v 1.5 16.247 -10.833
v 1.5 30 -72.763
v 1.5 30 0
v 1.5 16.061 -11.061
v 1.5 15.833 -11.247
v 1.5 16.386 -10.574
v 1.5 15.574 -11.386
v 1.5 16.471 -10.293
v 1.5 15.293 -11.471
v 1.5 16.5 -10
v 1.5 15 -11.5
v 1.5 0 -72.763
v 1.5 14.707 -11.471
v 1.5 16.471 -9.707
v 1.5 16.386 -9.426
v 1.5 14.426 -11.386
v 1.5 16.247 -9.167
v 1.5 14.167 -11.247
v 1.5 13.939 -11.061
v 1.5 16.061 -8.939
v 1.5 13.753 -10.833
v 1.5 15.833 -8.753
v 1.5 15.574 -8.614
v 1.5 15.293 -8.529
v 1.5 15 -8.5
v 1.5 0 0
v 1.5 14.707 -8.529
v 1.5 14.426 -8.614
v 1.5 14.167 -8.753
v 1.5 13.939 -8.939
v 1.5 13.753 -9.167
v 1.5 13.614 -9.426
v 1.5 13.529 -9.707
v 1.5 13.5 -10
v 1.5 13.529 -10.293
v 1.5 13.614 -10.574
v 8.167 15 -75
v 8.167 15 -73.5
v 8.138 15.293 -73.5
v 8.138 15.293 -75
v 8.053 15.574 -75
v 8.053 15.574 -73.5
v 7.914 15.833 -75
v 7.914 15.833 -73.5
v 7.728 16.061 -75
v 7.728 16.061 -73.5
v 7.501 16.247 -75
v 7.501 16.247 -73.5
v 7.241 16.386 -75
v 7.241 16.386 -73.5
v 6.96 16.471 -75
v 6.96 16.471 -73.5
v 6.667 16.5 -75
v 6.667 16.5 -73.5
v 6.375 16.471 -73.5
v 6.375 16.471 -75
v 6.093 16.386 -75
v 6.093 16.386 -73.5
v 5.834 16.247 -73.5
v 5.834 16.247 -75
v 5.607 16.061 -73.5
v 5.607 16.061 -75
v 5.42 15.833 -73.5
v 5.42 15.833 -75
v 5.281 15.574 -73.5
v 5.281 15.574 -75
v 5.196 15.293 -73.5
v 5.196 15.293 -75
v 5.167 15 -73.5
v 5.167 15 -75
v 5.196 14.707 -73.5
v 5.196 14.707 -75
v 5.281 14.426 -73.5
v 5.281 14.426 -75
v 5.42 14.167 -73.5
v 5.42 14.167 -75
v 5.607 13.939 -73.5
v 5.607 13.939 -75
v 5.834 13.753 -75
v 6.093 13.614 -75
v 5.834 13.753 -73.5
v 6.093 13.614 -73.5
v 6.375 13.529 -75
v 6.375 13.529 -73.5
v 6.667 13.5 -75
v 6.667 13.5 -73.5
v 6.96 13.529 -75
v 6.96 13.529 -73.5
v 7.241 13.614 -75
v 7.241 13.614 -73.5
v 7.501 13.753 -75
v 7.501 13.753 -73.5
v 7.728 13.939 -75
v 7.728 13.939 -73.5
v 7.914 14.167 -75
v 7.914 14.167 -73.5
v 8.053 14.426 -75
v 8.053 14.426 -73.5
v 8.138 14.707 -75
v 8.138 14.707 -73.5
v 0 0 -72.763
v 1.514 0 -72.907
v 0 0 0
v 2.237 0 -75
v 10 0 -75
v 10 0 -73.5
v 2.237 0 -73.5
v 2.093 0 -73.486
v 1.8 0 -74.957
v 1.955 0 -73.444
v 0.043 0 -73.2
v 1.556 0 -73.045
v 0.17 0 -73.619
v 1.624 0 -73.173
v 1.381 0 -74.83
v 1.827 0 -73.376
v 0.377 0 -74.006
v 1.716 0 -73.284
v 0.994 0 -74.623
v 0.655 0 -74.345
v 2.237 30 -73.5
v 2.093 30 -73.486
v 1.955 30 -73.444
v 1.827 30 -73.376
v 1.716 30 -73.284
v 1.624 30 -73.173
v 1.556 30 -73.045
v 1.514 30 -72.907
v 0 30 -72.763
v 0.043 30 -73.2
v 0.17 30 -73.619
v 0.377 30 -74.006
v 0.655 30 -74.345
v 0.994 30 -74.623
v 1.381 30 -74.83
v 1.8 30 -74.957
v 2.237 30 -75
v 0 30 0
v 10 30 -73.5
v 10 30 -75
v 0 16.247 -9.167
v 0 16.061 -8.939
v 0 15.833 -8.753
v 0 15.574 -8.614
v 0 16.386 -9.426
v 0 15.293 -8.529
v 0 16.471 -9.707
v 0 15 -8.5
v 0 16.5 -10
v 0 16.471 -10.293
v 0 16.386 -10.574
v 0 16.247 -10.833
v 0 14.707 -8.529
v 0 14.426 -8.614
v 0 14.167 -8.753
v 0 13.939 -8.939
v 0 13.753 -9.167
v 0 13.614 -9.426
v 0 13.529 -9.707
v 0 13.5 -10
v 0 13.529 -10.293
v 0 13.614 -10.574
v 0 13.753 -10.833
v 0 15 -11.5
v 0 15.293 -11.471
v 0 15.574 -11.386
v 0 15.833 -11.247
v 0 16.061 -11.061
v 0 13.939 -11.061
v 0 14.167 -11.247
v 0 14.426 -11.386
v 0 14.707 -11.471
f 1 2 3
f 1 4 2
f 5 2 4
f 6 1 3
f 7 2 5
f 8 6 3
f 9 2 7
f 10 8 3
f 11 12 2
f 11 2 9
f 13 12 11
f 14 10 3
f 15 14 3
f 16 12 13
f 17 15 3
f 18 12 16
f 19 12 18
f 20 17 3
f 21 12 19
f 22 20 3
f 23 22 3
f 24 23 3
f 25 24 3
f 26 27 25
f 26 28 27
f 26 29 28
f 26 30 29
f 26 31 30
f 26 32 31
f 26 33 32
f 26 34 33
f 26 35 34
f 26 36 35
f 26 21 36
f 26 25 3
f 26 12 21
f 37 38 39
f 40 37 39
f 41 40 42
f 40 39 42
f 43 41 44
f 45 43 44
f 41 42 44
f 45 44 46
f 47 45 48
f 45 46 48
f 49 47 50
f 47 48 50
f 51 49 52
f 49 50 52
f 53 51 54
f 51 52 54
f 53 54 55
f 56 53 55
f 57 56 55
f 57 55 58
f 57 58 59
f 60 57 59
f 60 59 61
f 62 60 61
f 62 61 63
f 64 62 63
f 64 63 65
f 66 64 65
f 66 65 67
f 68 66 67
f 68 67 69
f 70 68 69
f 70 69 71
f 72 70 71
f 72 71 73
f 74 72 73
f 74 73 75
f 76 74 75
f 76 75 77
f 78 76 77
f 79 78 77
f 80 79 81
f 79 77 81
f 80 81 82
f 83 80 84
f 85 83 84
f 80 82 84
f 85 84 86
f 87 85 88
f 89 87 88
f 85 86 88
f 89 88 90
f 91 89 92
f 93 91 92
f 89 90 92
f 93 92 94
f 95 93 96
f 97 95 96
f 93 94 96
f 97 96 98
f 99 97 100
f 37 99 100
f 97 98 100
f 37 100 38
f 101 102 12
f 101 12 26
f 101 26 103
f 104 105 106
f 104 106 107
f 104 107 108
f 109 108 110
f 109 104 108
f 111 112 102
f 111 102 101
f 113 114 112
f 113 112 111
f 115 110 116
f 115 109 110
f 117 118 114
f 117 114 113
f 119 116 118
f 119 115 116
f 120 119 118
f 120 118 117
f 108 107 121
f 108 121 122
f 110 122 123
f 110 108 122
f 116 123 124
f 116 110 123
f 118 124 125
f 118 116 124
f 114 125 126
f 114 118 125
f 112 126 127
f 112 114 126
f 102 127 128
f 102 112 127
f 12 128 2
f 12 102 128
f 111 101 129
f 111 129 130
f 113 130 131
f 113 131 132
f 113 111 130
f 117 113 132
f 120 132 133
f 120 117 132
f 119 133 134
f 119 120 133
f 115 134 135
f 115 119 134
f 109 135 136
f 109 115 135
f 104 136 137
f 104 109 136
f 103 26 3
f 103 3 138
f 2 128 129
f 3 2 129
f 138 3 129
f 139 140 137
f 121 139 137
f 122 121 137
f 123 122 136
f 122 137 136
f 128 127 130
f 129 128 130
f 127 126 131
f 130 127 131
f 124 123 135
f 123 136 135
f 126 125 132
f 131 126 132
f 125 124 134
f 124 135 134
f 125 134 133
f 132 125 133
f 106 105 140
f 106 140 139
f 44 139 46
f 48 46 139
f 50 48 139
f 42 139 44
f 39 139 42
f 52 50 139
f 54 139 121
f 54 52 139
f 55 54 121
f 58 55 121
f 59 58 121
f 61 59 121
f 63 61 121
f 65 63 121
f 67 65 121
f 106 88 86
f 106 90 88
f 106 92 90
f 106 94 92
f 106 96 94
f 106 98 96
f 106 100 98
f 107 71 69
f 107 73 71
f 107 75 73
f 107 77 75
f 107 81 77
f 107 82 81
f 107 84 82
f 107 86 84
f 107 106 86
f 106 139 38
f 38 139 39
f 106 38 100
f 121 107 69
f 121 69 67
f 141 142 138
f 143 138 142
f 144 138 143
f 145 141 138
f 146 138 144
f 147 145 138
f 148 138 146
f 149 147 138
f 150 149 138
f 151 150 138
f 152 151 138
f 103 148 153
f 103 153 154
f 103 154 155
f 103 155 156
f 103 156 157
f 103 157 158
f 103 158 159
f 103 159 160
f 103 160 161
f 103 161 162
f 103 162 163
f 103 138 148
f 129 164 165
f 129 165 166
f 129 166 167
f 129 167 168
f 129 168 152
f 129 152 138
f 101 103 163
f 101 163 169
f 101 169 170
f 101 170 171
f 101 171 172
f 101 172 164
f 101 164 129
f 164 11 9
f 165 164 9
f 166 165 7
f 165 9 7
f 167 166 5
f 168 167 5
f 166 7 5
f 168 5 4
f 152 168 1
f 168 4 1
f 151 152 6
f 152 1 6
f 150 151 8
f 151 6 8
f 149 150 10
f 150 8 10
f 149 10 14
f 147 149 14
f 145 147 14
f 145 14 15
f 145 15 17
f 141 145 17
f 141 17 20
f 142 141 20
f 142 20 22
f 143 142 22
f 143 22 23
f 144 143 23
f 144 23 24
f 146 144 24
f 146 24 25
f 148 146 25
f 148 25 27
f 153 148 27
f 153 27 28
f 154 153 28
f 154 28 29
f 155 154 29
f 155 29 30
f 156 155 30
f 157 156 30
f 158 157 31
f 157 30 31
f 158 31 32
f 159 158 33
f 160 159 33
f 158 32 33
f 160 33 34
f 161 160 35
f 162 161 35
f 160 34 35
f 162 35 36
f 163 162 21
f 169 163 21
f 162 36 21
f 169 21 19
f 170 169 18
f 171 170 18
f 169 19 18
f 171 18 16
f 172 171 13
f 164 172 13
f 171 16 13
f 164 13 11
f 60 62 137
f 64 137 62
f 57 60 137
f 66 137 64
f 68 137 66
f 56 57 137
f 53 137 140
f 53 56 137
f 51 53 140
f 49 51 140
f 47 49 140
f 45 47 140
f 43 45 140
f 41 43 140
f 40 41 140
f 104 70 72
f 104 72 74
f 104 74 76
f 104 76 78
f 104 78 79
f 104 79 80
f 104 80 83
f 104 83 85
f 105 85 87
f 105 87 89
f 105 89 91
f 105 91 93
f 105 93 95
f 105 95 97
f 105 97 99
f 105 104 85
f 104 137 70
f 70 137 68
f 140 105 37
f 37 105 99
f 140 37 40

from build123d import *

# Parameters (mm, degrees)
BASE_FLANGE1_DEPTH              = 30
F_3_0MM_PRESS_DOWEL_HOLE1_D     = 3
F_3_0MM_PRESS_DOWEL_HOLE2_D     = 3
F_3_0MM_PRESS_DOWEL_HOLE3_D     = 3
F_3_0MM_PRESS_DOWEL_HOLE3_DEPTH = 6
F_3_0MM_PRESS_DOWEL_HOLE3_TIP   = 0.901290929


# Sheet-metal steps are written as plain solids
with BuildPart() as part:
    # Sketch2 → Base-Flange1 (new body)
    with BuildSketch(Plane(origin=(0, 0, 0), x_dir=(1, 0, 0), z_dir=(0, 1, 0))):
        with BuildLine():
            Line((0, 0), (0, 72.7634))
            ThreePointArc((0, 72.7634), (0.655084973, 74.344915027), (2.2366, 75))
            Line((2.2366, 75), (10, 75))
            Line((10, 75), (10, 73.5))
            Line((10, 73.5), (2.2366, 73.5))
            ThreePointArc((2.2366, 73.5), (1.715745145, 73.284254855), (1.5, 72.7634))
            Line((1.5, 72.7634), (1.5, 0))
            Line((1.5, 0), (0, 0))
        make_face()
    extrude(amount=BASE_FLANGE1_DEPTH)

    # Ø3.0mm Press Dowel Hole1 (through all)
    with Locations(Plane(origin=(0, 0, -75), x_dir=(-1, 0, 0), z_dir=(0, 0, -1))):
        with Locations((-6.667186687, 15)):
            Hole(F_3_0MM_PRESS_DOWEL_HOLE1_D / 2)

    # Ø3.0mm Press Dowel Hole2 (through all)
    with Locations(Plane.ZY):
        with Locations((-10, 15)):
            Hole(F_3_0MM_PRESS_DOWEL_HOLE2_D / 2)

    # Ø3.0mm Press Dowel Hole3
    with Locations(Plane(origin=(-82.525513363, 241.531359221, -81), x_dir=(1, 0, 0), z_dir=(0, 0, -1))):
        with Locations((220.525513363, 156.531359221), (102.525513363, 181.531359221), (102.525513363, 271.531359221), (89.19270005, 226.531359221), (210.525513363, 317.793651488), (230.525513363, 317.793651488), (252.525513363, 320.462332131), (232.525513363, 300.462332131), (252.525513363, 132.600386311), (232.525513363, 152.600386311), (111.286271896, 136.531359221), (91.286271896, 136.531359221), (41.525513363, 196.432813402), (13.525513363, 196.432813402), (41.525513363, 138.767959221), (13.525513363, 138.767959221), (41.525513363, 256.62990504), (13.525513363, 256.62990504), (41.525513363, 314.294759221), (13.525513363, 314.294759221)):
            Hole(F_3_0MM_PRESS_DOWEL_HOLE3_D / 2, depth=F_3_0MM_PRESS_DOWEL_HOLE3_DEPTH)
            with Locations((0, 0, -(F_3_0MM_PRESS_DOWEL_HOLE3_DEPTH + F_3_0MM_PRESS_DOWEL_HOLE3_TIP / 2))):  # 118° drill point
                Cone(0, F_3_0MM_PRESS_DOWEL_HOLE3_D / 2, F_3_0MM_PRESS_DOWEL_HOLE3_TIP, mode=Mode.SUBTRACT)


solid = part.part
